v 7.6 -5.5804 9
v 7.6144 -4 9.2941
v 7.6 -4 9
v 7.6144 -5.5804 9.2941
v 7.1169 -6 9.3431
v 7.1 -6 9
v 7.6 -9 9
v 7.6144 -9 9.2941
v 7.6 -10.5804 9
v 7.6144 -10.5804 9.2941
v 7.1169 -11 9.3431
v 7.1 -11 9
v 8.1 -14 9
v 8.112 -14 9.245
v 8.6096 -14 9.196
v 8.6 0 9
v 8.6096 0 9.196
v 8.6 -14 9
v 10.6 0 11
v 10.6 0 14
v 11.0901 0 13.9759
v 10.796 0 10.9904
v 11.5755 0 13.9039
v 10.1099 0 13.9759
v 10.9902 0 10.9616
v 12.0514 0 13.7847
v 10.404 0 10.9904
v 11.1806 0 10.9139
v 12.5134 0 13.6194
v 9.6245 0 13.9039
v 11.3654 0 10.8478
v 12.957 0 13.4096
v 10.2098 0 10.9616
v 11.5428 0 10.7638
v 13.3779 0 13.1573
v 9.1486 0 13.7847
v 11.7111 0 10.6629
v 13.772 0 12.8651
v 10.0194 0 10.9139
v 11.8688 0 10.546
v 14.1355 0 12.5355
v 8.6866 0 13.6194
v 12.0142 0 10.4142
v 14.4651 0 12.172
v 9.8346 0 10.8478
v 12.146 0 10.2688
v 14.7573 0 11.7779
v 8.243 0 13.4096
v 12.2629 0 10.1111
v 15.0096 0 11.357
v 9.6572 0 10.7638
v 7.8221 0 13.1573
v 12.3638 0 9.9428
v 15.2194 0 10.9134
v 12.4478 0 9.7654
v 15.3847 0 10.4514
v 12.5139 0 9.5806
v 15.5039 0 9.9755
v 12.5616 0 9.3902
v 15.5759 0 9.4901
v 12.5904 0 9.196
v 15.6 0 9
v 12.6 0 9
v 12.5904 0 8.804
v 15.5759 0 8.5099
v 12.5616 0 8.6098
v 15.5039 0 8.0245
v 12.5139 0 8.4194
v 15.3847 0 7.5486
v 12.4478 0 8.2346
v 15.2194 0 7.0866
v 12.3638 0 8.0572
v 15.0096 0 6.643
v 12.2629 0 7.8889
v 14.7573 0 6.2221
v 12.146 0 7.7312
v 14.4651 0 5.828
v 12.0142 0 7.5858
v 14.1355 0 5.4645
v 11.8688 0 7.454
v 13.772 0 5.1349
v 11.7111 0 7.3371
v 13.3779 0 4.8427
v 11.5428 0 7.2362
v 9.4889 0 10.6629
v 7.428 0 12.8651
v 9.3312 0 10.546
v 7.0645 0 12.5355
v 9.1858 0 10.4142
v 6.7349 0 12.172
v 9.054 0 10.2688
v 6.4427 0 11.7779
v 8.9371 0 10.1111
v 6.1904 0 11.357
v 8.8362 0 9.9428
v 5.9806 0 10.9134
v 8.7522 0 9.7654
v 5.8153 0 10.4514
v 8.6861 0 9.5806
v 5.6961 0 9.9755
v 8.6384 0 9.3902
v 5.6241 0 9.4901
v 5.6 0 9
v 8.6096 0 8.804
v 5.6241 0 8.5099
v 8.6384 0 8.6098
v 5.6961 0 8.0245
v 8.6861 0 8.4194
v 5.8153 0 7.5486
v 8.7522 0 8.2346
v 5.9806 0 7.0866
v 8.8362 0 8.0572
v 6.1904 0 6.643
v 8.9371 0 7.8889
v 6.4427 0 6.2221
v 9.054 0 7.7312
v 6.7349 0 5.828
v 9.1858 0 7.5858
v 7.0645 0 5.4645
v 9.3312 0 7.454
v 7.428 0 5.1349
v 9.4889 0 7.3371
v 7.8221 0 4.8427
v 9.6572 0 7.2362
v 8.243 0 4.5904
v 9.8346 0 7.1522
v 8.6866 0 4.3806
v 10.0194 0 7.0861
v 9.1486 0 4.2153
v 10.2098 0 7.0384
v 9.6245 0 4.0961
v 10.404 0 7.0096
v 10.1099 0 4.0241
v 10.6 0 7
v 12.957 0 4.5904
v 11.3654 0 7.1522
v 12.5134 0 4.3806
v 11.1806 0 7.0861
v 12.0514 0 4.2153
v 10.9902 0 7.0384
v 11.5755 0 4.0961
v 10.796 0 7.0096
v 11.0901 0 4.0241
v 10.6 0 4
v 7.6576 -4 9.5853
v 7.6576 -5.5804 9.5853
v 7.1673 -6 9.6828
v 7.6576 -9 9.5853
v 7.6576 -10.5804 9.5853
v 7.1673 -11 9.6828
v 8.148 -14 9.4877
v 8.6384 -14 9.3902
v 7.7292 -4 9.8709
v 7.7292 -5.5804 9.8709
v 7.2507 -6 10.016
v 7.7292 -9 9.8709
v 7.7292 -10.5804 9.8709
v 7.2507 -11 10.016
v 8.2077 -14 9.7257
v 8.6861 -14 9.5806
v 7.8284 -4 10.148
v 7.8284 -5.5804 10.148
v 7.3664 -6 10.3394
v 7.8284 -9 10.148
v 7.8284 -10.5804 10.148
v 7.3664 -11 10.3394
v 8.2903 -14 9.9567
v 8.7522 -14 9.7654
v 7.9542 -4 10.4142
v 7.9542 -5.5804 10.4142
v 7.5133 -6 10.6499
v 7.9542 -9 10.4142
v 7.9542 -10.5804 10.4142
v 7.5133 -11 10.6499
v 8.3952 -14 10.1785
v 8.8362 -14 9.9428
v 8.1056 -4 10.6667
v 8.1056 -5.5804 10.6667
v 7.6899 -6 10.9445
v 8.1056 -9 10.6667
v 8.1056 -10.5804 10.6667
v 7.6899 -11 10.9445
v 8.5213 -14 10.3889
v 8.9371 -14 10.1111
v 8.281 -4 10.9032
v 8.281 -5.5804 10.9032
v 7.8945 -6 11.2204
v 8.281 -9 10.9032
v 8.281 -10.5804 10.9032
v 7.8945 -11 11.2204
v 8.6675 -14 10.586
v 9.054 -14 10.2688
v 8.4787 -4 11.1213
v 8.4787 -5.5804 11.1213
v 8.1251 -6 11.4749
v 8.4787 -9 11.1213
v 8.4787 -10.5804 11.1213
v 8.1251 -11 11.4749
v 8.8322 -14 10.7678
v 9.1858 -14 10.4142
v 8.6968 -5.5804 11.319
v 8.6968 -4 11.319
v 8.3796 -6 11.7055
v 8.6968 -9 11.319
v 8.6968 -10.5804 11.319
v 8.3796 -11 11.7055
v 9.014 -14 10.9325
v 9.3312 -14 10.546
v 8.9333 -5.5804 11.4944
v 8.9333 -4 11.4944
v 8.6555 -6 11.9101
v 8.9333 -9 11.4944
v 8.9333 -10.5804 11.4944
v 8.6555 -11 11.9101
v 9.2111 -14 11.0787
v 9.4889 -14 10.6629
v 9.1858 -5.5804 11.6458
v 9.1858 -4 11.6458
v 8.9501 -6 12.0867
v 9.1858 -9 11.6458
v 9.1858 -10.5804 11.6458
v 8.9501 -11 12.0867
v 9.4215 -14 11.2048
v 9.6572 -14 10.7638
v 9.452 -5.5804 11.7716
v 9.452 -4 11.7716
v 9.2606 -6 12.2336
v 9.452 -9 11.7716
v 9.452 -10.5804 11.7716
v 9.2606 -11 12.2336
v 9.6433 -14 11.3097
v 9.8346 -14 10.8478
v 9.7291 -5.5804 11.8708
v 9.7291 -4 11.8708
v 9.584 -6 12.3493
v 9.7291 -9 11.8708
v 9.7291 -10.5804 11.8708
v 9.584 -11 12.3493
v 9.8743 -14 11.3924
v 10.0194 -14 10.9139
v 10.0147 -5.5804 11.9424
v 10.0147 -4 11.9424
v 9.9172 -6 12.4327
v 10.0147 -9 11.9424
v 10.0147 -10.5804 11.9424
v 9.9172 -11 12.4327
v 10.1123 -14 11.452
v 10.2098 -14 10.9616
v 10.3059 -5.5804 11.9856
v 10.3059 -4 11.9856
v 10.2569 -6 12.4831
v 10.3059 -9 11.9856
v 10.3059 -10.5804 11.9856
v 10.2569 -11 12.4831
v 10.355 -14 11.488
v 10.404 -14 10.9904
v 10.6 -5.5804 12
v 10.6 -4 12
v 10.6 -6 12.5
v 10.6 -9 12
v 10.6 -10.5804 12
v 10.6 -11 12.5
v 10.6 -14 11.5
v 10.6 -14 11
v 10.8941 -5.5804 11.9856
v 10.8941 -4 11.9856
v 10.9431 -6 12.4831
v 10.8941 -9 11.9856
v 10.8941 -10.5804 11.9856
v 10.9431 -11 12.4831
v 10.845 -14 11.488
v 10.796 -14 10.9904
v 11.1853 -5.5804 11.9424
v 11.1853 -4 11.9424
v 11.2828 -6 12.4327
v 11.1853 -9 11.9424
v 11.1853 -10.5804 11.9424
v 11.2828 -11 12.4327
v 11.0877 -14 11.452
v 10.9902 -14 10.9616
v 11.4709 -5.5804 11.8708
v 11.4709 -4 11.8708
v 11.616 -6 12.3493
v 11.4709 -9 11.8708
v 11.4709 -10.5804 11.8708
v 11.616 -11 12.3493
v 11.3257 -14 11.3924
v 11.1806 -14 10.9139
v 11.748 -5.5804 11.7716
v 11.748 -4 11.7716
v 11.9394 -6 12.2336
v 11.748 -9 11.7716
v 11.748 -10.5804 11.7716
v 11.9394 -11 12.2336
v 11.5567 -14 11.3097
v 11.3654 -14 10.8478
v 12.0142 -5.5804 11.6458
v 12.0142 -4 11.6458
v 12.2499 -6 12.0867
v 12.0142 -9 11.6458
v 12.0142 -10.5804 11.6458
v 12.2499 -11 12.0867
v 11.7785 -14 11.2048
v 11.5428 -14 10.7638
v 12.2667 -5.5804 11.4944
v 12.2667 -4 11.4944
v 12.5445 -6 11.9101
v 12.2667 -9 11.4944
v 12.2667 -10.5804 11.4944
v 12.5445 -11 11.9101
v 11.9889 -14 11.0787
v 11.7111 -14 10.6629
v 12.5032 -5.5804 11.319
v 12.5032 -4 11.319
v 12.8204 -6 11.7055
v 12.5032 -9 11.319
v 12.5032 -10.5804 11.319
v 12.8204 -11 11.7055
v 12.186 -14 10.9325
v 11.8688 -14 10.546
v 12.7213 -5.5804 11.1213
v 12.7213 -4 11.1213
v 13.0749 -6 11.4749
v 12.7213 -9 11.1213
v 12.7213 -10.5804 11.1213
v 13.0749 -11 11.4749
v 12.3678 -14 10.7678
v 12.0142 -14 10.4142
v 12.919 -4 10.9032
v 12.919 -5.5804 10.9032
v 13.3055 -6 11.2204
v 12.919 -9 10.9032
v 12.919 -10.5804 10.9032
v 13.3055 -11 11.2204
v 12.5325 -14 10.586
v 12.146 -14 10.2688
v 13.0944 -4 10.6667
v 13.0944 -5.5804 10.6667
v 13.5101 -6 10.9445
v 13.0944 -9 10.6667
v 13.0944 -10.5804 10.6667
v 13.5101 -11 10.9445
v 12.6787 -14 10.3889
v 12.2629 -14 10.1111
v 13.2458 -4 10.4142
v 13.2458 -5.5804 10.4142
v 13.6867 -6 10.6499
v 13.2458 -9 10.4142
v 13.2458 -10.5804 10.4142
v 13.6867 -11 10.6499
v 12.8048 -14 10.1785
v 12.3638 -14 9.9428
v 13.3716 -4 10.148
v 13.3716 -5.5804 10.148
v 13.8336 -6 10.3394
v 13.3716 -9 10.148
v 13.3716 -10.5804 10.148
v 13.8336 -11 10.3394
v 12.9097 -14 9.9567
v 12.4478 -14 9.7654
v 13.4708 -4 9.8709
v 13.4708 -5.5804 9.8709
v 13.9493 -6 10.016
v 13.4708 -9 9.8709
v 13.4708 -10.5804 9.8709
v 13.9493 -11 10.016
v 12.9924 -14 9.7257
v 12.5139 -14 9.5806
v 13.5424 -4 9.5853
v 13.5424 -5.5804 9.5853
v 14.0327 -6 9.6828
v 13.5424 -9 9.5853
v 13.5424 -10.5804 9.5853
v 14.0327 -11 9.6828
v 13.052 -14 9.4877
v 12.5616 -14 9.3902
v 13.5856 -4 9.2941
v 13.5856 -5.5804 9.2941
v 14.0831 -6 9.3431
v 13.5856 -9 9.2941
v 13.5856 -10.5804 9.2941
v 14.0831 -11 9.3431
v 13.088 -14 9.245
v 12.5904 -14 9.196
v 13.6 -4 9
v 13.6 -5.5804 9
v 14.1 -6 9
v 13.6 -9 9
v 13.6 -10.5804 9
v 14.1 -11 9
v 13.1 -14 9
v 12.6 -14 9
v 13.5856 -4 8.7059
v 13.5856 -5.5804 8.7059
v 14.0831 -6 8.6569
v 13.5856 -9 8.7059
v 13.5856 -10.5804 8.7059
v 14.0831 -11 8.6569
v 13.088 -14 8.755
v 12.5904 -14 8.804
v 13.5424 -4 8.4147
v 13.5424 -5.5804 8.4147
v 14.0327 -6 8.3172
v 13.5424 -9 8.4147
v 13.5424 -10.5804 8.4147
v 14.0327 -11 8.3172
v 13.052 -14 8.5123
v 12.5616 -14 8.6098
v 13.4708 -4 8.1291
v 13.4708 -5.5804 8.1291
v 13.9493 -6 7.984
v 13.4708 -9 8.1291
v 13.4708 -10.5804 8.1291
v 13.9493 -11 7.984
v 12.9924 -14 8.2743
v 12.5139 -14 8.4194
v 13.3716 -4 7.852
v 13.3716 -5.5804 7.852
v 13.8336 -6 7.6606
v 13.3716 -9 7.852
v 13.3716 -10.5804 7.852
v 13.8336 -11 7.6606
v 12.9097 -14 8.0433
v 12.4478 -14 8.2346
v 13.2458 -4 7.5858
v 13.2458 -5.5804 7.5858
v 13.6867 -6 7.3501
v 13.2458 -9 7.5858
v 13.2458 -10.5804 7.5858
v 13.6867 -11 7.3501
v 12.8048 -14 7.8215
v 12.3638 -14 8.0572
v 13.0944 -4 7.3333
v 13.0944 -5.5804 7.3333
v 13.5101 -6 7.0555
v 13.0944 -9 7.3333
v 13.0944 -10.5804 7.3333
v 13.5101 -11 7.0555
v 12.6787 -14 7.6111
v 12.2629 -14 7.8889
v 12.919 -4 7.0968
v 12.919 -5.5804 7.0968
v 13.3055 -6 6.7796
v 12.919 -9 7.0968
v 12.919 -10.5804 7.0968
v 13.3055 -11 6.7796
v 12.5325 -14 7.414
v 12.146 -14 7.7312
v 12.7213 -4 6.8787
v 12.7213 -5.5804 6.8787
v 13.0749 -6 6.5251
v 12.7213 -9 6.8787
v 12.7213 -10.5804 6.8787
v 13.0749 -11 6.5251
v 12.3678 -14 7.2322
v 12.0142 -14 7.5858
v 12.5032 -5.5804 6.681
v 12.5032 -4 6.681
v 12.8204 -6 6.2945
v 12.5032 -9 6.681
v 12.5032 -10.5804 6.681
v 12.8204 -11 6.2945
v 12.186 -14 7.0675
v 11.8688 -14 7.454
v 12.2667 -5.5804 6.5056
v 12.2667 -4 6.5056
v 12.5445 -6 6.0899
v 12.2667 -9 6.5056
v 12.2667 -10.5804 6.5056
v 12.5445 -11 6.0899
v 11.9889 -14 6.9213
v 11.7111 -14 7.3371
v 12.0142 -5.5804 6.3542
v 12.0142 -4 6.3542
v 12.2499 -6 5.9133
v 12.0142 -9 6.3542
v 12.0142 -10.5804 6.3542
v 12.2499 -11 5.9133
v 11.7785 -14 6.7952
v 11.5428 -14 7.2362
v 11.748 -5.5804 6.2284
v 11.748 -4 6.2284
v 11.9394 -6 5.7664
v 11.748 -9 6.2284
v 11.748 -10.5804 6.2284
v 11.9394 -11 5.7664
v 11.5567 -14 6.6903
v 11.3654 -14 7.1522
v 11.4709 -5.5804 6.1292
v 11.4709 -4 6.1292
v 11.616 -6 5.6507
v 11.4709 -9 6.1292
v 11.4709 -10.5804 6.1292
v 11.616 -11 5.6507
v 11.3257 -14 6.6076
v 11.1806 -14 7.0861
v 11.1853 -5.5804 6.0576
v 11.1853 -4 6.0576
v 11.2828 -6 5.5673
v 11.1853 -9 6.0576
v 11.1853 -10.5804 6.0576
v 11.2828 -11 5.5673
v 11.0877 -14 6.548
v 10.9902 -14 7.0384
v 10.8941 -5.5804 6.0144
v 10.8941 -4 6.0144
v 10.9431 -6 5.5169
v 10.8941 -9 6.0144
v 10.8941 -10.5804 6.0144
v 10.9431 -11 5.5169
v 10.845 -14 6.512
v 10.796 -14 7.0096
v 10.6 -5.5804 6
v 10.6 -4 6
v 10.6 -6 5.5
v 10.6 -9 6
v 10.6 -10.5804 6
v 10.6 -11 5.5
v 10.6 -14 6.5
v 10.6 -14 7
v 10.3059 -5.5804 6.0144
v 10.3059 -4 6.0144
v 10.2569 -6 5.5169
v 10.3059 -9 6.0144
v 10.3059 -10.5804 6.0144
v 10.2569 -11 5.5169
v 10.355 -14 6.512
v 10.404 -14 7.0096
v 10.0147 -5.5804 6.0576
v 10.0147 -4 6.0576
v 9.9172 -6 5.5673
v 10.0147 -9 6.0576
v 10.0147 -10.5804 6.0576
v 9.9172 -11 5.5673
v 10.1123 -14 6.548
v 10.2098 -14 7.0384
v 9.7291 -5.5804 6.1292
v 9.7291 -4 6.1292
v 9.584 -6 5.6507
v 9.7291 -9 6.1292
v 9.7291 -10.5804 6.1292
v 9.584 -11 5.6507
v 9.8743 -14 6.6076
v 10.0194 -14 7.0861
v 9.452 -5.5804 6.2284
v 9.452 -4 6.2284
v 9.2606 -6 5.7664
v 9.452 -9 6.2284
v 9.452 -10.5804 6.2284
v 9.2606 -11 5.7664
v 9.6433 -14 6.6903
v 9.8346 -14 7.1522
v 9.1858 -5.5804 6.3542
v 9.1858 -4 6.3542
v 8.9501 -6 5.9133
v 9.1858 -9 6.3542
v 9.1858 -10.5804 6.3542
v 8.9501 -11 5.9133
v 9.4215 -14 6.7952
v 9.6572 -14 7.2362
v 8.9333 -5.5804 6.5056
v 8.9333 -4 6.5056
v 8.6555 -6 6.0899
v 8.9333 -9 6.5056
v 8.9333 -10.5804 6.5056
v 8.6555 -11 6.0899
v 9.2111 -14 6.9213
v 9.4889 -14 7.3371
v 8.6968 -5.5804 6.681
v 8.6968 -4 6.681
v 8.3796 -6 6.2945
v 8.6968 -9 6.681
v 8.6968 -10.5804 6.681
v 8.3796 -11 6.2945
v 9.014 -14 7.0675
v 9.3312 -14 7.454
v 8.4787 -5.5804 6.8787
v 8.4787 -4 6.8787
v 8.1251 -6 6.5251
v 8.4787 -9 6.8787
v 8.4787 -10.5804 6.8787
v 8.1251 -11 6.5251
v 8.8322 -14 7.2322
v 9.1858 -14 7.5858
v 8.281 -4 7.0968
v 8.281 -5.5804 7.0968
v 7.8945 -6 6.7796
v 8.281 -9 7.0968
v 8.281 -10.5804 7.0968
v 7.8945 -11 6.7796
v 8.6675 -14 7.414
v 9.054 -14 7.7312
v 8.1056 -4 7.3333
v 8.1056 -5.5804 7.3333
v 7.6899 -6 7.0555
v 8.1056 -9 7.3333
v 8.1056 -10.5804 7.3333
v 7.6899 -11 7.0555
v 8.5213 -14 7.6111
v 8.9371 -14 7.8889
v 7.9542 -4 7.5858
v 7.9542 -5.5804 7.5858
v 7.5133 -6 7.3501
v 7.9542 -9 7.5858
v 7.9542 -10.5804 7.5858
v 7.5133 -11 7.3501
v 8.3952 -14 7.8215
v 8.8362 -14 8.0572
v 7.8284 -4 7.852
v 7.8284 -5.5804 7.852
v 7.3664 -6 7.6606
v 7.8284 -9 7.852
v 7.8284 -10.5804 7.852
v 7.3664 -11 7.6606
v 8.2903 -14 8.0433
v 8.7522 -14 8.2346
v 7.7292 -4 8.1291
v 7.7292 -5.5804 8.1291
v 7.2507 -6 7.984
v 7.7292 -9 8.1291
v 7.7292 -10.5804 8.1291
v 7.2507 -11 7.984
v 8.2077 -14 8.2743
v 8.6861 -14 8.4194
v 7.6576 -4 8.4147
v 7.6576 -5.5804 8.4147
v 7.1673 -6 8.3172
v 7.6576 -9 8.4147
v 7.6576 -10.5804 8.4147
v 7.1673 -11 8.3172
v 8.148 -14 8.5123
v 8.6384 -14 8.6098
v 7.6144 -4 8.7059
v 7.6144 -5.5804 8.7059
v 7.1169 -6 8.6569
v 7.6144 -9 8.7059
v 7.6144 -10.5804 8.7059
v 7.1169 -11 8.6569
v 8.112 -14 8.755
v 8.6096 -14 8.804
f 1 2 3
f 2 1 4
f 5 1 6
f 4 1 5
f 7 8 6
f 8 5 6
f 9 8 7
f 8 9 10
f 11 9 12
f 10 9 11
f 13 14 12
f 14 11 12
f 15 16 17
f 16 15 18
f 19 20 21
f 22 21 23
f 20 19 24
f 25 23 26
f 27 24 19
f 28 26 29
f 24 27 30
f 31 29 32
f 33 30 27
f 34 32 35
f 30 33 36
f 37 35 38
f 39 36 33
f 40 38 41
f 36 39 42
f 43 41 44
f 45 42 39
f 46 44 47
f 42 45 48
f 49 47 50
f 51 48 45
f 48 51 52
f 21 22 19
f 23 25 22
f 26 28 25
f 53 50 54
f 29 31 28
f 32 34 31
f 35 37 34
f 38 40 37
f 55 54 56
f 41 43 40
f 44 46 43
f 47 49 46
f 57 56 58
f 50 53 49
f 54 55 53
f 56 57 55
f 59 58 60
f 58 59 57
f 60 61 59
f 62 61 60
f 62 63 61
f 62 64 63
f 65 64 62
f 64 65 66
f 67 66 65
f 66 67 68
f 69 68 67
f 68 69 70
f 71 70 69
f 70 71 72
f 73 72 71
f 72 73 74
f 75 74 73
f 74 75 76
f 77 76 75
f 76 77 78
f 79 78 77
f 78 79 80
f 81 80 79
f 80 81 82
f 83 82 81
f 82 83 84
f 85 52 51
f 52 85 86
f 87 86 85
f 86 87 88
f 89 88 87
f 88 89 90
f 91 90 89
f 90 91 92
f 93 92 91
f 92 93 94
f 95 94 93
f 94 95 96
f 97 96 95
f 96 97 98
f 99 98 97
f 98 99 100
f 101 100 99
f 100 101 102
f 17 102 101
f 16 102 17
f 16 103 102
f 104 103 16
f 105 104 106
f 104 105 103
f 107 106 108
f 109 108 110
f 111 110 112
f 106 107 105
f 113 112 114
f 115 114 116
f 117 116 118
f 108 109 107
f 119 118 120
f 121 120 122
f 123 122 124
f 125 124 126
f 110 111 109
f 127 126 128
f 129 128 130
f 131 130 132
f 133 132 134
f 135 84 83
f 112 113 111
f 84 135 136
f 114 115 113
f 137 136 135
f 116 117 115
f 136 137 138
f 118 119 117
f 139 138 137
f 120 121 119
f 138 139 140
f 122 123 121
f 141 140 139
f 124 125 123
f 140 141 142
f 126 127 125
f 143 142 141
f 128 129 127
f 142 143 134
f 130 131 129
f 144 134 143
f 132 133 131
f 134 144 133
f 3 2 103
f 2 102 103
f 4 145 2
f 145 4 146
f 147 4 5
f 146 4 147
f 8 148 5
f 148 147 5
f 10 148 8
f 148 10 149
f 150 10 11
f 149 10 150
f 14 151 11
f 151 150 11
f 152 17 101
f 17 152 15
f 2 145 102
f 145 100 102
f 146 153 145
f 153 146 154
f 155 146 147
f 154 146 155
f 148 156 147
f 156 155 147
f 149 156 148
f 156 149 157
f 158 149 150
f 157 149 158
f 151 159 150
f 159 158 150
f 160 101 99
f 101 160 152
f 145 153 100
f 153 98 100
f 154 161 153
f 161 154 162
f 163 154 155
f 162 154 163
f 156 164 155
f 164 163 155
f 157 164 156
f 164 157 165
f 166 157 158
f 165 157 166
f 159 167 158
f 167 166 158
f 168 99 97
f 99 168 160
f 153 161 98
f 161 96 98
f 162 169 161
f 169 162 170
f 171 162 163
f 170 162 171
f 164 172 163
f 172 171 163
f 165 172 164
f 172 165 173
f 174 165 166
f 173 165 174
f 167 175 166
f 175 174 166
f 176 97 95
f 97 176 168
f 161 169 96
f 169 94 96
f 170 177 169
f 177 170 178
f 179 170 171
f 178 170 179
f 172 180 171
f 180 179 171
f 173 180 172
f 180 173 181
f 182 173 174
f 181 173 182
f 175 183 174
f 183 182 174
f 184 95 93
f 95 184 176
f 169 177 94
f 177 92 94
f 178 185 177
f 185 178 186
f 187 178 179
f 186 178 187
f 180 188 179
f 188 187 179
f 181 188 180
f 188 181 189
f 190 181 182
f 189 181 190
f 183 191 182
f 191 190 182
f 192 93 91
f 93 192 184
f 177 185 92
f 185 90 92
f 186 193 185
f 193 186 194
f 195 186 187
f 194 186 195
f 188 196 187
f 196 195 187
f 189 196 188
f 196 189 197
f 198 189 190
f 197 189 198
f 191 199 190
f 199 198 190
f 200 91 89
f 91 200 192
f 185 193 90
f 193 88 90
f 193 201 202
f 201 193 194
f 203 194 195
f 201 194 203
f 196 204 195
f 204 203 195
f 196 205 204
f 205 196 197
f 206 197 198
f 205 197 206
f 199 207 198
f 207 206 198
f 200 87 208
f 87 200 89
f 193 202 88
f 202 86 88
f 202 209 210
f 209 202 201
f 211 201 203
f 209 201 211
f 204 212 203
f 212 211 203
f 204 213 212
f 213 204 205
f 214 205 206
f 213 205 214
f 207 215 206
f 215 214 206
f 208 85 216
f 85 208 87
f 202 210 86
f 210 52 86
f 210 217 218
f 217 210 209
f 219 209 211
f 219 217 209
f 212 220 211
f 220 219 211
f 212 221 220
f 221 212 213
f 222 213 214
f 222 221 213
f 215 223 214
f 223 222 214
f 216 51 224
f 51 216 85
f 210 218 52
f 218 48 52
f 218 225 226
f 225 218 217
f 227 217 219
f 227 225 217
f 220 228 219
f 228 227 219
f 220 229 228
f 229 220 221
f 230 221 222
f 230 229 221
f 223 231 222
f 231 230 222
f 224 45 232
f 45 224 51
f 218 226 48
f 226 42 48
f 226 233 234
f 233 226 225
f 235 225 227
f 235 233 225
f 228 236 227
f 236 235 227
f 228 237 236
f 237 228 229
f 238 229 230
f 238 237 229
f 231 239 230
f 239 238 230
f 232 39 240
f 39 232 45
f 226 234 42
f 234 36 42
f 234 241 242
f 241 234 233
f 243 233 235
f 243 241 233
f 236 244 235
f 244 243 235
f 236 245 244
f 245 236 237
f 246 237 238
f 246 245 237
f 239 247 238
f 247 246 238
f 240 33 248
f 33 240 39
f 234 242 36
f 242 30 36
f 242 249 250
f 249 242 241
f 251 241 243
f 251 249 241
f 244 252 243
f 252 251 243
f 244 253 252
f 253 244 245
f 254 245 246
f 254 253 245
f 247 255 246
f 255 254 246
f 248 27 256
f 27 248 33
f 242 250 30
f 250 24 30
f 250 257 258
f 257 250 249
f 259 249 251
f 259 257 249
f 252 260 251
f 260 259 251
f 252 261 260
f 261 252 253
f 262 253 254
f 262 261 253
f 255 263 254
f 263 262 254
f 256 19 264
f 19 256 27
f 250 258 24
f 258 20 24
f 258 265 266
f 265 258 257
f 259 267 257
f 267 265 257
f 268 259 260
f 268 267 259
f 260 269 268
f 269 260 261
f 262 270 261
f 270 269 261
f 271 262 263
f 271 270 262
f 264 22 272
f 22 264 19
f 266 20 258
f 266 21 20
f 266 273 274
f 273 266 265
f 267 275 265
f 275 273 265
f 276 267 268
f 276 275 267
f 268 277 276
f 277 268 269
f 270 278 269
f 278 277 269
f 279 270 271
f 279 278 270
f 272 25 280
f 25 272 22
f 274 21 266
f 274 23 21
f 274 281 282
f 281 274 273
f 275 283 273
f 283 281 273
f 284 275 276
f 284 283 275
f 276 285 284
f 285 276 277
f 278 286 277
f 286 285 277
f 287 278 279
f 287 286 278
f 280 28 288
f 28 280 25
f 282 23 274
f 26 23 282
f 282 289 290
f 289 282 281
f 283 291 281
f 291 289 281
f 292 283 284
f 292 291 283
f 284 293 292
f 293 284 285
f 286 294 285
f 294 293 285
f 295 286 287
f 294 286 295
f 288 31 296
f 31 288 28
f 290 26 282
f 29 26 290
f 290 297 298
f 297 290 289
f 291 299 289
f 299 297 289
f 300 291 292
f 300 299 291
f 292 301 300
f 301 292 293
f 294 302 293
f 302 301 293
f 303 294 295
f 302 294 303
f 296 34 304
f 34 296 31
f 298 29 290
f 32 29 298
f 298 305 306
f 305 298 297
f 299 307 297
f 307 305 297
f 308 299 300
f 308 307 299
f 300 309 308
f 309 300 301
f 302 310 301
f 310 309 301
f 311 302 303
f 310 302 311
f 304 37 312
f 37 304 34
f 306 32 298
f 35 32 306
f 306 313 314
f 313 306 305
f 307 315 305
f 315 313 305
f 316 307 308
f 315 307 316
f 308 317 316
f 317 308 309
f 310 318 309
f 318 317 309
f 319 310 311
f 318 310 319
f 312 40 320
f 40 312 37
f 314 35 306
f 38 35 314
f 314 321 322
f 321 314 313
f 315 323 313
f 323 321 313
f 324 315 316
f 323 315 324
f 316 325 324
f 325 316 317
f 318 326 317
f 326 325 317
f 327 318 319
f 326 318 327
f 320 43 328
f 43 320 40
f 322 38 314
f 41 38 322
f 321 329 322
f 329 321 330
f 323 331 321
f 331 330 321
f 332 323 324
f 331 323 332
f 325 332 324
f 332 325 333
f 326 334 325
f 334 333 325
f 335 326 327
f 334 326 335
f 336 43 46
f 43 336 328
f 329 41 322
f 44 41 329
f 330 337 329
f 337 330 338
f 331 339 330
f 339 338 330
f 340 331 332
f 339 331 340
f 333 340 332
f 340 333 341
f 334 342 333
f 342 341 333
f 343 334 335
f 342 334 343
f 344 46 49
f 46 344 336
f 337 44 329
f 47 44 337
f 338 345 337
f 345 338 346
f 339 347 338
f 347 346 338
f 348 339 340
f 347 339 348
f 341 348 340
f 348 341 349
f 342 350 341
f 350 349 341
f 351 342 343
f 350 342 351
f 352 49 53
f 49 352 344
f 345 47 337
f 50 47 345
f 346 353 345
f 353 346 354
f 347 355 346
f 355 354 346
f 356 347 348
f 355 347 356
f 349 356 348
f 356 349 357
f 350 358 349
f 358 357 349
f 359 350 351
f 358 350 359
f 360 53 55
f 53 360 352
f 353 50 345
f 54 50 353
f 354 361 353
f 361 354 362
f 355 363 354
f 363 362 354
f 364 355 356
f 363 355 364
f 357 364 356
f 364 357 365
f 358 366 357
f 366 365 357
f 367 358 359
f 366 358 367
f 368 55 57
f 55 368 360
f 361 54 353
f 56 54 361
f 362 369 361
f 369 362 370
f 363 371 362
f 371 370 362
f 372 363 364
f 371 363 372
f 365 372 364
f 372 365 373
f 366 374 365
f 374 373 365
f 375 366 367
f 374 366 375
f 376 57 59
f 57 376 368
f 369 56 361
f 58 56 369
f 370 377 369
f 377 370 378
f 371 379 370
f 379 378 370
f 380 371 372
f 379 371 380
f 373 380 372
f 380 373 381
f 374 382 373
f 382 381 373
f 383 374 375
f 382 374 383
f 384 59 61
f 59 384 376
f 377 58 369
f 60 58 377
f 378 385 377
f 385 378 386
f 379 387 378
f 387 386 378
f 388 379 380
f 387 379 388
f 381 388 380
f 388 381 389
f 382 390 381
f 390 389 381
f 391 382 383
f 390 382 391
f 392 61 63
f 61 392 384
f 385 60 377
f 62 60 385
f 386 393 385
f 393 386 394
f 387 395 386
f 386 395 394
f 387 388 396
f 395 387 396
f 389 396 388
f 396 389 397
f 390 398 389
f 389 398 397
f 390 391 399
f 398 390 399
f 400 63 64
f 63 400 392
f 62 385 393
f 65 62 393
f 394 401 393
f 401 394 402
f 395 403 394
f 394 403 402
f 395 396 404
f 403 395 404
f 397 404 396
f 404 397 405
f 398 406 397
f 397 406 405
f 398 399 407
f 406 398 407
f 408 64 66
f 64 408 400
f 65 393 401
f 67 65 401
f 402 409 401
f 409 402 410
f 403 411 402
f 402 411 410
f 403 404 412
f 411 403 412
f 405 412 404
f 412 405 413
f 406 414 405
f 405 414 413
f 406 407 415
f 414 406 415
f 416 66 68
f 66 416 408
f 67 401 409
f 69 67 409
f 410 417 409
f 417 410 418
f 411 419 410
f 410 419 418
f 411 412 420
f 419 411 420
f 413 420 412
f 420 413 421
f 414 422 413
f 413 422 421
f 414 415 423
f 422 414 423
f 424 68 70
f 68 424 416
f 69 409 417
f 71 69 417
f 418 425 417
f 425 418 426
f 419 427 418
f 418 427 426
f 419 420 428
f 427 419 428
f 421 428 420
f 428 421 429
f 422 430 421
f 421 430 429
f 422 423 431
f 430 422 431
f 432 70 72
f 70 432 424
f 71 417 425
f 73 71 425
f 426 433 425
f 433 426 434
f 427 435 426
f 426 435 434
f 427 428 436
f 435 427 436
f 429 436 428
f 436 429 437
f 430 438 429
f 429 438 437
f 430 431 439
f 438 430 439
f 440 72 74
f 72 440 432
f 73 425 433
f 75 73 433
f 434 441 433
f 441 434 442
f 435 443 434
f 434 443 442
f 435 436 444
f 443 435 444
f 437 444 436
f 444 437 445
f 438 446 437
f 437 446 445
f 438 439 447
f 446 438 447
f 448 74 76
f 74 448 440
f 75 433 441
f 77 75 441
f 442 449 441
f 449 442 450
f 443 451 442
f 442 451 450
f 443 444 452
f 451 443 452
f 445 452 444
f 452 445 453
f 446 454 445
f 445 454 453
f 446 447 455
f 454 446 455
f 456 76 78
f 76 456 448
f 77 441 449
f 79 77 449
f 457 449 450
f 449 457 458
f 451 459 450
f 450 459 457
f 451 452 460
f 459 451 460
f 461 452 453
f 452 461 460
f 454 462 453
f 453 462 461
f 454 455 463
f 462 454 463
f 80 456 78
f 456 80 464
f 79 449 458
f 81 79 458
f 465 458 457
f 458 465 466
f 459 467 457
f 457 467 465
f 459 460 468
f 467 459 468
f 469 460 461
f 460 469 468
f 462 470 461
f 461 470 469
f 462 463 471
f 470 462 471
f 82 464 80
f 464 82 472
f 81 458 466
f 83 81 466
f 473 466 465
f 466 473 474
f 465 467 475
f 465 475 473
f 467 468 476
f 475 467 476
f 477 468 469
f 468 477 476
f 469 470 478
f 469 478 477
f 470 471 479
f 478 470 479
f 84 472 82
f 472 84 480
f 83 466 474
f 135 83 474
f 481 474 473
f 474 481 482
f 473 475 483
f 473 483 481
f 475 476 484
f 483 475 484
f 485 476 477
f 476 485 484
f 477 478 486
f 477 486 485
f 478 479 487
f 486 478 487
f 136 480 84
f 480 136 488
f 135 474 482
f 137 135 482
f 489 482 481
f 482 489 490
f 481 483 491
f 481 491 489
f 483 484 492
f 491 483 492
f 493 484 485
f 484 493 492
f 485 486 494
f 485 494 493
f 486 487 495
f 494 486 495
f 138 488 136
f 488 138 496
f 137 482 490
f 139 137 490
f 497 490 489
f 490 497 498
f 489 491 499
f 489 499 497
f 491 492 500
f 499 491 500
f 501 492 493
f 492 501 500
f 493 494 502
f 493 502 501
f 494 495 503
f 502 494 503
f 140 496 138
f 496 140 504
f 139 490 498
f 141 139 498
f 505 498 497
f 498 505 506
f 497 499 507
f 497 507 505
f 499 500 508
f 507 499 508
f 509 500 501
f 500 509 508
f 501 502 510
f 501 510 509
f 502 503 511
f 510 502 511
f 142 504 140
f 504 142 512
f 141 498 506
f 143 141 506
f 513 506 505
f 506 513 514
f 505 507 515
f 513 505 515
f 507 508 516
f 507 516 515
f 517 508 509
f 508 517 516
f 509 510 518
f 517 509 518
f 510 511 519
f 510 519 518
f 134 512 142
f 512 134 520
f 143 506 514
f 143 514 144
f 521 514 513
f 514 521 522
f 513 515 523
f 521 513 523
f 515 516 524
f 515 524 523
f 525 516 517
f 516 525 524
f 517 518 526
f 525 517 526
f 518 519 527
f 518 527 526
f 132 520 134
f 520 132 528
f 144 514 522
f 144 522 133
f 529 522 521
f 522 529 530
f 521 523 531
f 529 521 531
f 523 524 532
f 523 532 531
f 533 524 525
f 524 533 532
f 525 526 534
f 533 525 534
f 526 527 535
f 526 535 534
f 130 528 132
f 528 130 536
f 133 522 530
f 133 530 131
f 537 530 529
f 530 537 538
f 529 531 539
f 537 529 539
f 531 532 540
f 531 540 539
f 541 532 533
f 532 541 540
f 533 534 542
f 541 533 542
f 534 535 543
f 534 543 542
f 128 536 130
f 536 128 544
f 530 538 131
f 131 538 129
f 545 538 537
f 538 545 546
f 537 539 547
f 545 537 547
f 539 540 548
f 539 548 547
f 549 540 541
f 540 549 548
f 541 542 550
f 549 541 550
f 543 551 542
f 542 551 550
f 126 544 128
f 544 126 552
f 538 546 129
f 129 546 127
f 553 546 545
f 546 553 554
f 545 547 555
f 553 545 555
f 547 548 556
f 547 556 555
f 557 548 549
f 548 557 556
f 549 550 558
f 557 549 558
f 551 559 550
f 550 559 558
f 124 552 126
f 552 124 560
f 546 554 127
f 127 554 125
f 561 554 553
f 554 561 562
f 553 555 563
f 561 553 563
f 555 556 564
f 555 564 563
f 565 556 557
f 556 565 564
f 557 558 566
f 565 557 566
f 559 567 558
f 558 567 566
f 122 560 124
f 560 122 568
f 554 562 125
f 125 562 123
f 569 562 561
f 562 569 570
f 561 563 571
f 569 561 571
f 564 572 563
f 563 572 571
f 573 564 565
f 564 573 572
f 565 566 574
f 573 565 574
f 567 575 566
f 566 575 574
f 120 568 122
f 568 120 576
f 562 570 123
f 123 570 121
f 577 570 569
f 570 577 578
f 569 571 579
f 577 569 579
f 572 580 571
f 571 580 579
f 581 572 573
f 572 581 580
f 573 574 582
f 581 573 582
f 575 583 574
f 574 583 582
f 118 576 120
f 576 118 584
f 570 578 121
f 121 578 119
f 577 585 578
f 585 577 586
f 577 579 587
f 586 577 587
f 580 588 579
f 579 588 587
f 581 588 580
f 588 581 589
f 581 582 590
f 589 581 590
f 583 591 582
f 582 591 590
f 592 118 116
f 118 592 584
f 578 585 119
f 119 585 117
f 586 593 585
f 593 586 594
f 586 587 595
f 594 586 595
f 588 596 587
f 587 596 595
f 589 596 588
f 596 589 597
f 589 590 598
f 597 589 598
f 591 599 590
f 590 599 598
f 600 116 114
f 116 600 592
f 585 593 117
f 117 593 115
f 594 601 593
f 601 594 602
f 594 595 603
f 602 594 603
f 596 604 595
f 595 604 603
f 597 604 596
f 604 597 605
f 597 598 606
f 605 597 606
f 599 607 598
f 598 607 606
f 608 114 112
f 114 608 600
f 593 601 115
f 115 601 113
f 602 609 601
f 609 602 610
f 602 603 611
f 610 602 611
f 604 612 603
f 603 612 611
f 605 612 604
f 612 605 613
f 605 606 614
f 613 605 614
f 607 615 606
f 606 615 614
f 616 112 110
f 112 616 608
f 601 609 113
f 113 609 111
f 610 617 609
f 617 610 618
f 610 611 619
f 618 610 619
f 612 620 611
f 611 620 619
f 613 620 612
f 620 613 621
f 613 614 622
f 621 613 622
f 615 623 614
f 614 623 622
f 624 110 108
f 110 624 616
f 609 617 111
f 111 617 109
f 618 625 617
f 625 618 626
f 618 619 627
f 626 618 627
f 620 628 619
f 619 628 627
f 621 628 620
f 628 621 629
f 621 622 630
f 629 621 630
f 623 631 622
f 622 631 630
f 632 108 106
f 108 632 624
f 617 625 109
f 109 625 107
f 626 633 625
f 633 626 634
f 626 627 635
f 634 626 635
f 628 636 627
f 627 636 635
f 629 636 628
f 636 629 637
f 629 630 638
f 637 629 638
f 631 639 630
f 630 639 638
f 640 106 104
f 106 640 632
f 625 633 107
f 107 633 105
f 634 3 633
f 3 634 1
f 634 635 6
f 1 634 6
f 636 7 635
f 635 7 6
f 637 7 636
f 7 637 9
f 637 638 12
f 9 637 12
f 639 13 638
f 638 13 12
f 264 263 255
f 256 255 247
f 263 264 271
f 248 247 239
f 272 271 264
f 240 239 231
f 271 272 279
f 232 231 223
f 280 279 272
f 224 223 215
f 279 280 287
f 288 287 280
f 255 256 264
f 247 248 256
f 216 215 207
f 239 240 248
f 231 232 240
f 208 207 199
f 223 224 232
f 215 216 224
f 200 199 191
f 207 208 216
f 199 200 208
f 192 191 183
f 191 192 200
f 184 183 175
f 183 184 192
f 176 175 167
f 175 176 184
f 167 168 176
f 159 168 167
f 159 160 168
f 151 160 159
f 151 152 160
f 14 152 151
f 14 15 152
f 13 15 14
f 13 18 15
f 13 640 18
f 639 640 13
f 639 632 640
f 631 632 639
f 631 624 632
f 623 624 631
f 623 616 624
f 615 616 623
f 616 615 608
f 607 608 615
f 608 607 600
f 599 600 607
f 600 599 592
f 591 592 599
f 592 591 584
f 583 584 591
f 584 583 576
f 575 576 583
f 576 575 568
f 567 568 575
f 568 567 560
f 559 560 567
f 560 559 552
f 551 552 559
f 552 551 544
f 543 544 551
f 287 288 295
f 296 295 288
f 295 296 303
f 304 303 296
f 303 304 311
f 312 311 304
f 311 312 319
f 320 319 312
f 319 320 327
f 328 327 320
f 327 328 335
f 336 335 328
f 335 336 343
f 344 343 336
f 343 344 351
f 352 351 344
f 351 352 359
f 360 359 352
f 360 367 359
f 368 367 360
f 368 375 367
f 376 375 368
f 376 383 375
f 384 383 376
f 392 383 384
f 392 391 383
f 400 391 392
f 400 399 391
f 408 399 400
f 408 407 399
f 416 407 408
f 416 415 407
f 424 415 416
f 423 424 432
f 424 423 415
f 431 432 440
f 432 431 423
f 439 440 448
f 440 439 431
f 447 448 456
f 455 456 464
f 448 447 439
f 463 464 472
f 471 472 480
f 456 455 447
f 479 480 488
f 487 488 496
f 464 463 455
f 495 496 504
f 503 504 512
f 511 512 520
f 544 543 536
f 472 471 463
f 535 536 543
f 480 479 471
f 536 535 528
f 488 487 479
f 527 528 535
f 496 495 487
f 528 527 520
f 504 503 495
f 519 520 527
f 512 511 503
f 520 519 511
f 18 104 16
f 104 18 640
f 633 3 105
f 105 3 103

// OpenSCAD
// file: ../lib/barb.scad
// lib/barb.scad — hose barb: a rotate_extrude of a 2D (r, z) profile, axis +Z from z=0.
// Reproduces valveV2's connector (outlet, flanged) and connector_8mm (inlet) sketches:
//   a shank of shank_d carrying `ridges` crests of ridge_d; each crest rises on a face `steep`°
//   from the axis (on the base side) and tapers back to the shank over taper_len; the last
//   taper ends at tip_d on the end face z=len; bore through.
//   flange = [d, h]: a cone from ø d on z=0 to the shank at z=h (v2 exitSupport), undef = none.
//   gap: shank between the end of one taper and the next crest. v2 constrains it to 2 in both
//   sketches (DistanceX 2), so the 9-argument call reproduces v2; params.scad's barb_ridge_gap
//   is the same number for callers that want it explicit.
// The caller's $fn sets the roundness (use fn_round: these seal).

// z of crest i (0-based, counted from the base): the last crest is taper_len short of the end.
function barb_crest_z(len, ridges, taper_len, gap, i) = len - taper_len - (ridges - 1 - i)*(taper_len + gap);
// axial length of a crest's steep rise
function barb_rise_dz(shank_d, ridge_d, steep) = (ridge_d - shank_d)/2/tan(steep);

// Drop consecutive duplicate points (a rise that starts exactly where the shank starts).
function _dedupe(p, i=0, acc=[]) =
    i >= len(p) ? acc
    : _dedupe(p, i + 1, (len(acc) > 0 && norm(p[i] - acc[len(acc) - 1]) < 1e-9) ? acc : concat(acc, [p[i]]));

// The (r, z) polygon: base face, shank, crests, end face, back along the bore.
function barb_profile(bore, shank_d, ridge_d, len, ridges, taper_len, tip_d, steep, flange, gap=2) =
    let(rb = bore/2, rs = shank_d/2, rr = ridge_d/2, rt = tip_d/2,
        dz = barb_rise_dz(shank_d, ridge_d, steep),
        z_shank0 = is_undef(flange) ? 0 : flange[1],
        base = is_undef(flange) ? [[rb, 0], [rs, 0]] : [[rb, 0], [flange[0]/2, 0], [rs, flange[1]]],
        crests = [for (i = [0 : ridges - 1]) let(zc = barb_crest_z(len, ridges, taper_len, gap, i))
                    each [[rs, zc - dz], [rr, zc], i == ridges - 1 ? [rt, len] : [rs, zc + taper_len]]],
        ok = assert(ridges >= 1, "barb: ridges >= 1")
             assert(rr > rs && rs > rb && rt >= rb, "barb: need ridge_d > shank_d > bore and tip_d >= bore")
             assert(barb_crest_z(len, ridges, taper_len, gap, 0) - dz >= z_shank0 - 1e-9,
                    "barb: first crest rises before the shank starts: shorter flange, fewer ridges or a longer barb")
             assert(gap >= dz - 1e-9, "barb: gap shorter than the crest rise")
             true)
    _dedupe(concat(base, crests, [[rb, len]]));

module barb(bore, shank_d, ridge_d, len, ridges, taper_len, tip_d, steep, flange, gap=2) {
    rotate_extrude()
        polygon(barb_profile(bore, shank_d, ridge_d, len, ridges, taper_len, tip_d, steep, flange, gap));
}
// main file
// parts/outlet_barb.scad — the hose barb glued under the floor at each outlet [v2 connector]:
// lib/barb.scad's profile with the outlet_* parameters, flange cone on the floor, pointing −Y.
// `outlet_barb(i)` places it on gate i's outlet axis (W/2, 0, gate_z(i)); the assembly calls
// it once per gate. The barb's own axis (+Z from the flange face) is the print orientation.
include <../params.scad>
use <../lib/barb.scad>
$fn = fn_round;
for_print = false;
eps = 0.01;

// [x, y, z] extents in the assembly frame: the flange is the widest part
function outlet_barb_size() = [outlet_flange[0], outlet_barb[3], outlet_flange[0]];

// the barb on its own axis, +Z from the flange face at z=0 (= print orientation)
module outlet_barb_axial() {
    // the bore is already in the revolved profile; a cutter that lies inside it changes nothing
    // but makes the export a CGAL solid (a bare rotate_extrude reports only facets)
    difference() {
        barb(outlet_barb[0], outlet_barb[1], outlet_barb[2], outlet_barb[3], barb_ridges,
             outlet_barb_prof[0], outlet_barb_prof[1], barb_steep, outlet_flange, barb_ridge_gap);
        translate([0, 0, -eps]) cylinder(d=outlet_barb[0] - 2*eps, h=outlet_barb[3] + 2*eps);
    }
}

// in the assembly frame under gate i (rotate +90 about X points the barb's +Z down −Y)
module outlet_barb(i=0) { translate([W/2, 0, gate_z(i)]) rotate([90, 0, 0]) outlet_barb_axial(); }

// flange face on the bed, barb vertical: the ridges' steep faces are 0.5 mm steps
module outlet_barb_print() { outlet_barb_axial(); }

if (is_undef(ASSEMBLY)) {
    echo(outlet_barb_size=outlet_barb_size());
    if (for_print) outlet_barb_print(); else outlet_barb();
}
